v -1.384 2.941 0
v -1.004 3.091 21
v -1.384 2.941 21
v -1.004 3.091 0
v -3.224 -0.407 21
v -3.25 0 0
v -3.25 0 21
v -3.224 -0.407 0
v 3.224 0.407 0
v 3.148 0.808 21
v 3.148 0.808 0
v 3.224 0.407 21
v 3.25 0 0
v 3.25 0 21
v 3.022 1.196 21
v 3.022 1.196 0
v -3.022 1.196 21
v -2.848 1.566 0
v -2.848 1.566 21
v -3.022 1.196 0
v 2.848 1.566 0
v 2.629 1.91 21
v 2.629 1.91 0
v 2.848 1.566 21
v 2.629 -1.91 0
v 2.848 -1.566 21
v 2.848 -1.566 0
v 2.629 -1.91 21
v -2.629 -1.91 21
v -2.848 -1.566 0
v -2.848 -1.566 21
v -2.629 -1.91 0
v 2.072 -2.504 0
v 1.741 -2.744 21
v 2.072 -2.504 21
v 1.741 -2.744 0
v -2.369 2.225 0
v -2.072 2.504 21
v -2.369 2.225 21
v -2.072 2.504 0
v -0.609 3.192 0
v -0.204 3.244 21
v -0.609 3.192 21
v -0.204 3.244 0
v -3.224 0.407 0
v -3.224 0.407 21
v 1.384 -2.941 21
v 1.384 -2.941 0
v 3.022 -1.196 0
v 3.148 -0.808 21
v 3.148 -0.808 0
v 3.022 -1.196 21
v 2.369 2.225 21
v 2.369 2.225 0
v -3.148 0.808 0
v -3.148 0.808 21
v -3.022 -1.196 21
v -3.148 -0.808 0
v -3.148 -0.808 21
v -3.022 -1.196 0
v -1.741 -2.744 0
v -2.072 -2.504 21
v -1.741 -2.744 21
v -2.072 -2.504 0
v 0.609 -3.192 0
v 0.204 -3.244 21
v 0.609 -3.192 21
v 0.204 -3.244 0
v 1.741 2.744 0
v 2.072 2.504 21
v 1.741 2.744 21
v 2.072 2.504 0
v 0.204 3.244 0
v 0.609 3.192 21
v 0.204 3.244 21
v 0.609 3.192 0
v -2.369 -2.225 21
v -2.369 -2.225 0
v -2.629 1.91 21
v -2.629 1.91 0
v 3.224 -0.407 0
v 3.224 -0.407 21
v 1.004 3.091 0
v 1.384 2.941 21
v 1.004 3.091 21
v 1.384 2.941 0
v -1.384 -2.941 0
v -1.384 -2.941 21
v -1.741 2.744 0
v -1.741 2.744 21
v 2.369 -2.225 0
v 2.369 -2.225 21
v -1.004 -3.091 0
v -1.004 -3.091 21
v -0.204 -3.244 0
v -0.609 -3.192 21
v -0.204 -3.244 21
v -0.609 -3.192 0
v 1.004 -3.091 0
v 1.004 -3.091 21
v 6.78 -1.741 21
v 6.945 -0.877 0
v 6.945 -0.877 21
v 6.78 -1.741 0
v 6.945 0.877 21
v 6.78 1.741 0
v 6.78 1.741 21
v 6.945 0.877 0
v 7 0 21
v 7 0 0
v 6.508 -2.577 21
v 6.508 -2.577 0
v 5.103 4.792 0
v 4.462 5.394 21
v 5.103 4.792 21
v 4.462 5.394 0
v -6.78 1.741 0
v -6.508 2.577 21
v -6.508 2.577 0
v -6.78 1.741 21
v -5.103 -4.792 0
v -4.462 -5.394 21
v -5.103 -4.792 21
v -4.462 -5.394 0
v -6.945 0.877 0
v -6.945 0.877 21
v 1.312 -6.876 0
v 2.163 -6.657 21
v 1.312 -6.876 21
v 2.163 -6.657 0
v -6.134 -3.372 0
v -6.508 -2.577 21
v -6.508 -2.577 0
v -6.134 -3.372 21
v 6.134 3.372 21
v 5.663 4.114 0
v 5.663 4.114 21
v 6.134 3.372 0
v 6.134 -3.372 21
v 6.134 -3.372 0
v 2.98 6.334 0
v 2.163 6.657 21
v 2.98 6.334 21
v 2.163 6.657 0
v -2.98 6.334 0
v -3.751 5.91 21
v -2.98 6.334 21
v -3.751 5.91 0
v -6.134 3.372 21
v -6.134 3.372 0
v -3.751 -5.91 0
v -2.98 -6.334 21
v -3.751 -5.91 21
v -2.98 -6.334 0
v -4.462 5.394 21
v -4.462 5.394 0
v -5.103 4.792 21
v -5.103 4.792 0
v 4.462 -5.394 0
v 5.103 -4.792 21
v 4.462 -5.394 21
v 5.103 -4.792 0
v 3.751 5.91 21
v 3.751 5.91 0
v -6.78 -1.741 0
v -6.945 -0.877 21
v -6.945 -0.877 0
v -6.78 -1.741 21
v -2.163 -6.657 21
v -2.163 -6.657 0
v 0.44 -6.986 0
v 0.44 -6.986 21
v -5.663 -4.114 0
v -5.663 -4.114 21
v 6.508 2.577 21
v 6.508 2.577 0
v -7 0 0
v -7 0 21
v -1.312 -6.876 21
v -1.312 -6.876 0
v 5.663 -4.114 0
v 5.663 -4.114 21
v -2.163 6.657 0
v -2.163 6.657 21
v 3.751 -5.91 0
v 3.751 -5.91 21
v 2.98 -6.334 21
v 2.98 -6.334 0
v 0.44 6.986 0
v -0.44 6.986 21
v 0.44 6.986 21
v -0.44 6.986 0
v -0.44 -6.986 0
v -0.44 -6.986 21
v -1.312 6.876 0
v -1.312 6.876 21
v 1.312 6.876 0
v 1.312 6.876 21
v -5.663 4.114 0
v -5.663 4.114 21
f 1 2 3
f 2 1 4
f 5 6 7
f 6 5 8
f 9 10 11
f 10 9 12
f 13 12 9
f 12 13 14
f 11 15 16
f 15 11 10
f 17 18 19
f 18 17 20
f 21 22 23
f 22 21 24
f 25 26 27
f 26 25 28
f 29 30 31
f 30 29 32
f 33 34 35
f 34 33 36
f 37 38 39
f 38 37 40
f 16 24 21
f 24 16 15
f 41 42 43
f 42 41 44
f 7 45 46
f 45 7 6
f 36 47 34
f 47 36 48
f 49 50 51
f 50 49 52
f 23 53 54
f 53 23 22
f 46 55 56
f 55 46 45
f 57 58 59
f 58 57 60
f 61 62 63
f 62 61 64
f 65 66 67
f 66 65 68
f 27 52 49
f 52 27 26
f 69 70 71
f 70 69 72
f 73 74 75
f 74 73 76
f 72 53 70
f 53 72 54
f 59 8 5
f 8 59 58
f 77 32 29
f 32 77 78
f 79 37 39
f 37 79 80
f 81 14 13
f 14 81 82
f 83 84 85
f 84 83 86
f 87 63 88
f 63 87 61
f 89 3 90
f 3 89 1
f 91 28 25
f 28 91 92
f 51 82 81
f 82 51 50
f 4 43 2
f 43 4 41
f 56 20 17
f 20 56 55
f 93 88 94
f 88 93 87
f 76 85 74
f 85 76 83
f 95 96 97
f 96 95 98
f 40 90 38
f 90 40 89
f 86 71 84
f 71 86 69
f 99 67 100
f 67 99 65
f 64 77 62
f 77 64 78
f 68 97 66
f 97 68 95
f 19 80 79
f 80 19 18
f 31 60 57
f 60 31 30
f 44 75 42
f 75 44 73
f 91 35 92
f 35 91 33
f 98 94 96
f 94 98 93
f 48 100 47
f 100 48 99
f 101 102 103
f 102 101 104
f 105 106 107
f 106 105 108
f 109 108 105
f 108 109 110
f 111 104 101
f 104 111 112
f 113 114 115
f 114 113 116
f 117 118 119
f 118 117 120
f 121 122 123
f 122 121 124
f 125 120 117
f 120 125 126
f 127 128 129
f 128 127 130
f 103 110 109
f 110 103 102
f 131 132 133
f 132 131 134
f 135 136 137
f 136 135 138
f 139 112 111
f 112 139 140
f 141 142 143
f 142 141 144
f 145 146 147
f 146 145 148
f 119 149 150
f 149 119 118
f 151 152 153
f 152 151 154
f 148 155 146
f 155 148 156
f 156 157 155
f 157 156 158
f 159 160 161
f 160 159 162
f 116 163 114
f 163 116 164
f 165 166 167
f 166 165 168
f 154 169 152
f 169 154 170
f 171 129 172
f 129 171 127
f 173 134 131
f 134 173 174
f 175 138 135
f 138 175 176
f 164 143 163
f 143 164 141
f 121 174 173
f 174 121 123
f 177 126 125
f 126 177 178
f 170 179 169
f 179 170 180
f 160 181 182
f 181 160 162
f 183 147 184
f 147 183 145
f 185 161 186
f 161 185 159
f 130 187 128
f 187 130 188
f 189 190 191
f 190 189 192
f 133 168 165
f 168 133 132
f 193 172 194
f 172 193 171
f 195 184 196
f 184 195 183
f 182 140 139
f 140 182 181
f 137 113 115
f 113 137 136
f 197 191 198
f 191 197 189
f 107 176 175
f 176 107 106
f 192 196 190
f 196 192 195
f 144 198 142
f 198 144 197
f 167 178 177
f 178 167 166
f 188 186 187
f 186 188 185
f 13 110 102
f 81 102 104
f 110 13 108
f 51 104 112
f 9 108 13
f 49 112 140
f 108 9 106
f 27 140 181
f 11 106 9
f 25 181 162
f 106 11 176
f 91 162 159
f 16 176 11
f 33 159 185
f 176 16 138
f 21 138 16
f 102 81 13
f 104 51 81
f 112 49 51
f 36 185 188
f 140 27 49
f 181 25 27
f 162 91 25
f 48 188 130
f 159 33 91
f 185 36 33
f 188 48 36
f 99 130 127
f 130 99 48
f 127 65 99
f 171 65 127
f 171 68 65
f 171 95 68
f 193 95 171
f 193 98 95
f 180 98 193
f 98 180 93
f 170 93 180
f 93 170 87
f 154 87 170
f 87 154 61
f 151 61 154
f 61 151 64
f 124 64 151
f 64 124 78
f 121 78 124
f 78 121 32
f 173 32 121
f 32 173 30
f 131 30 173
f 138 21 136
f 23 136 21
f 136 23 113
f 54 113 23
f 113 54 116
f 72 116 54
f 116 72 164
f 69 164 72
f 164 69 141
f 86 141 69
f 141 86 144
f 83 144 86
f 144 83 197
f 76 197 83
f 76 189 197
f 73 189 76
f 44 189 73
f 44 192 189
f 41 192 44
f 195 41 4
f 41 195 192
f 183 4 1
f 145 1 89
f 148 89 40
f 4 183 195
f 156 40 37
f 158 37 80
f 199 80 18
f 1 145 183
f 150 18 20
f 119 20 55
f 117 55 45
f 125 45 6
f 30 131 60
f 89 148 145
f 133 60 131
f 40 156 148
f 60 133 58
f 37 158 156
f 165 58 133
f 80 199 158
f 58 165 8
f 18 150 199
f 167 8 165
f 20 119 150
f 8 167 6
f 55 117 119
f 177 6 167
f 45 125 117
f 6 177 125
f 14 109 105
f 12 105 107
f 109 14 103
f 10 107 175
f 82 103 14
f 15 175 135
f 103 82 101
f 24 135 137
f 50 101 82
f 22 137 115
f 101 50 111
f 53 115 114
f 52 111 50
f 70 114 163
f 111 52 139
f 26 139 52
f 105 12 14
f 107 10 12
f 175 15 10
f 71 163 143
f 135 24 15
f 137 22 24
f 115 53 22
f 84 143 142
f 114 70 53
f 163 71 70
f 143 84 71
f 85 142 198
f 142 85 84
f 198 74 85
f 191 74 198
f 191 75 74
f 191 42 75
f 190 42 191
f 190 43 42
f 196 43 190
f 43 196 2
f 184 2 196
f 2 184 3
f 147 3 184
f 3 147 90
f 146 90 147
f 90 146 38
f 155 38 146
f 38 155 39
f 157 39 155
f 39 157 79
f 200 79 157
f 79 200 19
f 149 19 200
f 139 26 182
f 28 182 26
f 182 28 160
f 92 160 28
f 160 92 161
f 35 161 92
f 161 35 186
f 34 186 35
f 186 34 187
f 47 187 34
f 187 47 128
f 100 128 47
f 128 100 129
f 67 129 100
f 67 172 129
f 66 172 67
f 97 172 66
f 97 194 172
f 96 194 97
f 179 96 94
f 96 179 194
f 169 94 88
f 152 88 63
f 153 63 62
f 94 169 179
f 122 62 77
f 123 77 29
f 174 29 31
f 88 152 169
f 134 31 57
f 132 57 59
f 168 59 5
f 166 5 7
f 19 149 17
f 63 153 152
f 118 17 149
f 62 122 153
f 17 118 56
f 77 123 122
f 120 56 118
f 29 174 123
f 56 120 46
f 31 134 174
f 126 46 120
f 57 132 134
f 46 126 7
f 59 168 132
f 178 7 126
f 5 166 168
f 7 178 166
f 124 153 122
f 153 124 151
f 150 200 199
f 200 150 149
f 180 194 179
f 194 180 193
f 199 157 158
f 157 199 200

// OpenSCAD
$fn = 50;


difference() {
	union() {
		translate(v = [0, 0, 0]) {
			rotate(a = [0, 0, 0]) {
				cylinder(h = 21, r = 7.0000000000);
			}
		}
	}
	union() {
		translate(v = [0.0000000000, 0.0000000000, 0]) {
			rotate(a = [0, 0, 0]) {
				translate(v = [0, 0, -50]) {
					rotate(a = [0, 0, 0]) {
						cylinder(h = 100, r = 3.2500000000);
					}
				}
			}
		}
		translate(v = [0.0000000000, 0.0000000000, 0]) {
			rotate(a = [0, 0, 0]) {
				translate(v = [0, 0, -50]) {
					rotate(a = [0, 0, 0]) {
						cylinder(h = 100, r = 1.8000000000);
					}
				}
			}
		}
	}
}
